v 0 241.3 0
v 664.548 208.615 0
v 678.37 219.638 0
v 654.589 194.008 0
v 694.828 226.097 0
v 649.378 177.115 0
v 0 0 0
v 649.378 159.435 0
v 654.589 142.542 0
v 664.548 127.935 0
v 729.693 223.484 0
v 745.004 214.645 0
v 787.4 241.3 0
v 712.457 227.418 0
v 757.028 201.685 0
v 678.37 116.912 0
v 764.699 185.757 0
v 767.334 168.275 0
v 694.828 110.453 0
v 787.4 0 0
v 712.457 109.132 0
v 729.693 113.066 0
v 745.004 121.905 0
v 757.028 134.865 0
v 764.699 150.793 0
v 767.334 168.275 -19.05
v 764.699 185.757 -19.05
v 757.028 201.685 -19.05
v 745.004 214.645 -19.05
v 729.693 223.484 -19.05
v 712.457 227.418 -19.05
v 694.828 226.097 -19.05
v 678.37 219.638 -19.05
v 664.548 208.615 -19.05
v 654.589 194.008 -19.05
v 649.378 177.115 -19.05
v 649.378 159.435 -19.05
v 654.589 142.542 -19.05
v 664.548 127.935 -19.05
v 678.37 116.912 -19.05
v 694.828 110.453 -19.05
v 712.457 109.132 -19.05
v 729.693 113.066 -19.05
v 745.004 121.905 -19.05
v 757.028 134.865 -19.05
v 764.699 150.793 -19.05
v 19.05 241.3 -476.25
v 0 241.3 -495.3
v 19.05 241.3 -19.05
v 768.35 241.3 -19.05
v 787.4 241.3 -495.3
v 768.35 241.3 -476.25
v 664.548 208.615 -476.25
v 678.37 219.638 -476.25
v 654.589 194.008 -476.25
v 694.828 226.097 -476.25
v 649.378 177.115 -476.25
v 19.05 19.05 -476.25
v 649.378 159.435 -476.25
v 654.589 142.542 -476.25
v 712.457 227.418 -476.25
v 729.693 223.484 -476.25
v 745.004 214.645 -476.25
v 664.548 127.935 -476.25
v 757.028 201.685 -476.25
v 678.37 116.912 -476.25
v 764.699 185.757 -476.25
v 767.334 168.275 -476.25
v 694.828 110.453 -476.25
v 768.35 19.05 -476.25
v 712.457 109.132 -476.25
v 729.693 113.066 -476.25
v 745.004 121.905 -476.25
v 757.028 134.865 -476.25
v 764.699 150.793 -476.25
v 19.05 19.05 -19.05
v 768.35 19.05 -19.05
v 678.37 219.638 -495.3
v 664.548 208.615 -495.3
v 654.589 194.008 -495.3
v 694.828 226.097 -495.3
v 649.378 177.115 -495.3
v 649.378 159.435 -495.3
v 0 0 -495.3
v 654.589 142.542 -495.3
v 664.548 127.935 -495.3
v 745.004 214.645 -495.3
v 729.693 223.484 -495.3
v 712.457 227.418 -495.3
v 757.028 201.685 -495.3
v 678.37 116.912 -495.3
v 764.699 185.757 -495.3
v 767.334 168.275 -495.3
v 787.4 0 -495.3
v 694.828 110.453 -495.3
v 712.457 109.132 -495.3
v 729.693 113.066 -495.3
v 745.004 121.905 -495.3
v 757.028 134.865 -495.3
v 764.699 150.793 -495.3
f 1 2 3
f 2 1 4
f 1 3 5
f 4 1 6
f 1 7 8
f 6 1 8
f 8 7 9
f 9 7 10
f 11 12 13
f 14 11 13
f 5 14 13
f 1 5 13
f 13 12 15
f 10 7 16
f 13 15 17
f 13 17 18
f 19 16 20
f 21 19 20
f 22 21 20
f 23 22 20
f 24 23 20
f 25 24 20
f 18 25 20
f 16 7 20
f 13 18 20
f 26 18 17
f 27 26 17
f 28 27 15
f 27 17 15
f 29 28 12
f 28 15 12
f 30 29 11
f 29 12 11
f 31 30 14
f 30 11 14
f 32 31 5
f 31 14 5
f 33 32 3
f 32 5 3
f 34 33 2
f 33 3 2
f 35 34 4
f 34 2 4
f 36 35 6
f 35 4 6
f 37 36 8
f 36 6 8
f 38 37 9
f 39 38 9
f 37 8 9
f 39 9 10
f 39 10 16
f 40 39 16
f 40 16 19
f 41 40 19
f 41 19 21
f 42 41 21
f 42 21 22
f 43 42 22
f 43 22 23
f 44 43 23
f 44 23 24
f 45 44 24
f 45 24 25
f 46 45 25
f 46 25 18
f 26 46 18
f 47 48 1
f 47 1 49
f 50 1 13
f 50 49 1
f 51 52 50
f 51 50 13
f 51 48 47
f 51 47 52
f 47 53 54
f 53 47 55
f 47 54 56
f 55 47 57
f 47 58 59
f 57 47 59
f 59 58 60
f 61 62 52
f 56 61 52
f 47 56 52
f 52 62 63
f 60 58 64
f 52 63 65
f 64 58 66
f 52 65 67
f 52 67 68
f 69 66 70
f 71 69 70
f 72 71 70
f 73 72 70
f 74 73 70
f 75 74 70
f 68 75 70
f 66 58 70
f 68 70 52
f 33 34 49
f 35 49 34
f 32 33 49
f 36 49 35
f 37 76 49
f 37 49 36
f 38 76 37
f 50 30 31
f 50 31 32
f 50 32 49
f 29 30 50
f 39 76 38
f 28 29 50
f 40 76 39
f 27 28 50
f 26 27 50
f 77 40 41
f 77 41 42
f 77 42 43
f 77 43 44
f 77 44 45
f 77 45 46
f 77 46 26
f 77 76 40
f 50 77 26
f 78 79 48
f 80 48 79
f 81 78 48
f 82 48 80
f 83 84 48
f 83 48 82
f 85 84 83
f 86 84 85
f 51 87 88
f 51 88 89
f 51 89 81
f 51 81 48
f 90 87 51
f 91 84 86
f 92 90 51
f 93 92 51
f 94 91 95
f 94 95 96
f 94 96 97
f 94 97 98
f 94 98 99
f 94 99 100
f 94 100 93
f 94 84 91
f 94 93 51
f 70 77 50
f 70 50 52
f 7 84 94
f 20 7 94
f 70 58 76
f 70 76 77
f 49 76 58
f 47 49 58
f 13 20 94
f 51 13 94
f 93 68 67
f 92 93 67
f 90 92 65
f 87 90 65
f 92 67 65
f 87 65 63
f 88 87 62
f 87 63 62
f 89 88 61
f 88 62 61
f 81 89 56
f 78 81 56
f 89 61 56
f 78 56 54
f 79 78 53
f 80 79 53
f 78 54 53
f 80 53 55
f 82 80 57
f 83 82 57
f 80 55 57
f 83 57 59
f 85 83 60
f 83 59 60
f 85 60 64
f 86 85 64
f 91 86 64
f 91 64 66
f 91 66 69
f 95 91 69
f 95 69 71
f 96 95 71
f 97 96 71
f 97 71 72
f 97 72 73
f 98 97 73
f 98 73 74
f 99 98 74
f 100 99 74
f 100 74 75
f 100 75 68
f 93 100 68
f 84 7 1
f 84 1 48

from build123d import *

# Parameters (mm, degrees)
SKETCH1_W           = 787.4
SKETCH1_H           = 495.3
BOSS_EXTRUDE1_DEPTH = 241.3
SHELL1_T            = -19.05
SKETCH2_R           = 59.309
CUT_EXTRUDE1_DEPTH  = 496.3


with BuildPart() as part:
    # Sketch1 → Boss-Extrude1 (new body)
    with BuildSketch(Plane(origin=(0, 0, 0), x_dir=(1, 0, 0), z_dir=(0, 1, 0))):
        with Locations((393.7, 247.65)):
            Rectangle(SKETCH1_W, SKETCH1_H)
    extrude(amount=BOSS_EXTRUDE1_DEPTH)

    # Shell1
    shell1_openings = [part.faces().sort_by_distance(p)[0] for p in [
        (393.7, 241.3, -247.65),
    ]]
    offset(amount=SHELL1_T, openings=shell1_openings, kind=Kind.INTERSECTION)

    # Sketch2 → Cut-Extrude1 (cut, through all)
    with BuildSketch(Plane.XY):
        with Locations((708.025, 168.275)):
            Circle(SKETCH2_R)
    extrude(amount=-CUT_EXTRUDE1_DEPTH, mode=Mode.SUBTRACT)


solid = part.part
